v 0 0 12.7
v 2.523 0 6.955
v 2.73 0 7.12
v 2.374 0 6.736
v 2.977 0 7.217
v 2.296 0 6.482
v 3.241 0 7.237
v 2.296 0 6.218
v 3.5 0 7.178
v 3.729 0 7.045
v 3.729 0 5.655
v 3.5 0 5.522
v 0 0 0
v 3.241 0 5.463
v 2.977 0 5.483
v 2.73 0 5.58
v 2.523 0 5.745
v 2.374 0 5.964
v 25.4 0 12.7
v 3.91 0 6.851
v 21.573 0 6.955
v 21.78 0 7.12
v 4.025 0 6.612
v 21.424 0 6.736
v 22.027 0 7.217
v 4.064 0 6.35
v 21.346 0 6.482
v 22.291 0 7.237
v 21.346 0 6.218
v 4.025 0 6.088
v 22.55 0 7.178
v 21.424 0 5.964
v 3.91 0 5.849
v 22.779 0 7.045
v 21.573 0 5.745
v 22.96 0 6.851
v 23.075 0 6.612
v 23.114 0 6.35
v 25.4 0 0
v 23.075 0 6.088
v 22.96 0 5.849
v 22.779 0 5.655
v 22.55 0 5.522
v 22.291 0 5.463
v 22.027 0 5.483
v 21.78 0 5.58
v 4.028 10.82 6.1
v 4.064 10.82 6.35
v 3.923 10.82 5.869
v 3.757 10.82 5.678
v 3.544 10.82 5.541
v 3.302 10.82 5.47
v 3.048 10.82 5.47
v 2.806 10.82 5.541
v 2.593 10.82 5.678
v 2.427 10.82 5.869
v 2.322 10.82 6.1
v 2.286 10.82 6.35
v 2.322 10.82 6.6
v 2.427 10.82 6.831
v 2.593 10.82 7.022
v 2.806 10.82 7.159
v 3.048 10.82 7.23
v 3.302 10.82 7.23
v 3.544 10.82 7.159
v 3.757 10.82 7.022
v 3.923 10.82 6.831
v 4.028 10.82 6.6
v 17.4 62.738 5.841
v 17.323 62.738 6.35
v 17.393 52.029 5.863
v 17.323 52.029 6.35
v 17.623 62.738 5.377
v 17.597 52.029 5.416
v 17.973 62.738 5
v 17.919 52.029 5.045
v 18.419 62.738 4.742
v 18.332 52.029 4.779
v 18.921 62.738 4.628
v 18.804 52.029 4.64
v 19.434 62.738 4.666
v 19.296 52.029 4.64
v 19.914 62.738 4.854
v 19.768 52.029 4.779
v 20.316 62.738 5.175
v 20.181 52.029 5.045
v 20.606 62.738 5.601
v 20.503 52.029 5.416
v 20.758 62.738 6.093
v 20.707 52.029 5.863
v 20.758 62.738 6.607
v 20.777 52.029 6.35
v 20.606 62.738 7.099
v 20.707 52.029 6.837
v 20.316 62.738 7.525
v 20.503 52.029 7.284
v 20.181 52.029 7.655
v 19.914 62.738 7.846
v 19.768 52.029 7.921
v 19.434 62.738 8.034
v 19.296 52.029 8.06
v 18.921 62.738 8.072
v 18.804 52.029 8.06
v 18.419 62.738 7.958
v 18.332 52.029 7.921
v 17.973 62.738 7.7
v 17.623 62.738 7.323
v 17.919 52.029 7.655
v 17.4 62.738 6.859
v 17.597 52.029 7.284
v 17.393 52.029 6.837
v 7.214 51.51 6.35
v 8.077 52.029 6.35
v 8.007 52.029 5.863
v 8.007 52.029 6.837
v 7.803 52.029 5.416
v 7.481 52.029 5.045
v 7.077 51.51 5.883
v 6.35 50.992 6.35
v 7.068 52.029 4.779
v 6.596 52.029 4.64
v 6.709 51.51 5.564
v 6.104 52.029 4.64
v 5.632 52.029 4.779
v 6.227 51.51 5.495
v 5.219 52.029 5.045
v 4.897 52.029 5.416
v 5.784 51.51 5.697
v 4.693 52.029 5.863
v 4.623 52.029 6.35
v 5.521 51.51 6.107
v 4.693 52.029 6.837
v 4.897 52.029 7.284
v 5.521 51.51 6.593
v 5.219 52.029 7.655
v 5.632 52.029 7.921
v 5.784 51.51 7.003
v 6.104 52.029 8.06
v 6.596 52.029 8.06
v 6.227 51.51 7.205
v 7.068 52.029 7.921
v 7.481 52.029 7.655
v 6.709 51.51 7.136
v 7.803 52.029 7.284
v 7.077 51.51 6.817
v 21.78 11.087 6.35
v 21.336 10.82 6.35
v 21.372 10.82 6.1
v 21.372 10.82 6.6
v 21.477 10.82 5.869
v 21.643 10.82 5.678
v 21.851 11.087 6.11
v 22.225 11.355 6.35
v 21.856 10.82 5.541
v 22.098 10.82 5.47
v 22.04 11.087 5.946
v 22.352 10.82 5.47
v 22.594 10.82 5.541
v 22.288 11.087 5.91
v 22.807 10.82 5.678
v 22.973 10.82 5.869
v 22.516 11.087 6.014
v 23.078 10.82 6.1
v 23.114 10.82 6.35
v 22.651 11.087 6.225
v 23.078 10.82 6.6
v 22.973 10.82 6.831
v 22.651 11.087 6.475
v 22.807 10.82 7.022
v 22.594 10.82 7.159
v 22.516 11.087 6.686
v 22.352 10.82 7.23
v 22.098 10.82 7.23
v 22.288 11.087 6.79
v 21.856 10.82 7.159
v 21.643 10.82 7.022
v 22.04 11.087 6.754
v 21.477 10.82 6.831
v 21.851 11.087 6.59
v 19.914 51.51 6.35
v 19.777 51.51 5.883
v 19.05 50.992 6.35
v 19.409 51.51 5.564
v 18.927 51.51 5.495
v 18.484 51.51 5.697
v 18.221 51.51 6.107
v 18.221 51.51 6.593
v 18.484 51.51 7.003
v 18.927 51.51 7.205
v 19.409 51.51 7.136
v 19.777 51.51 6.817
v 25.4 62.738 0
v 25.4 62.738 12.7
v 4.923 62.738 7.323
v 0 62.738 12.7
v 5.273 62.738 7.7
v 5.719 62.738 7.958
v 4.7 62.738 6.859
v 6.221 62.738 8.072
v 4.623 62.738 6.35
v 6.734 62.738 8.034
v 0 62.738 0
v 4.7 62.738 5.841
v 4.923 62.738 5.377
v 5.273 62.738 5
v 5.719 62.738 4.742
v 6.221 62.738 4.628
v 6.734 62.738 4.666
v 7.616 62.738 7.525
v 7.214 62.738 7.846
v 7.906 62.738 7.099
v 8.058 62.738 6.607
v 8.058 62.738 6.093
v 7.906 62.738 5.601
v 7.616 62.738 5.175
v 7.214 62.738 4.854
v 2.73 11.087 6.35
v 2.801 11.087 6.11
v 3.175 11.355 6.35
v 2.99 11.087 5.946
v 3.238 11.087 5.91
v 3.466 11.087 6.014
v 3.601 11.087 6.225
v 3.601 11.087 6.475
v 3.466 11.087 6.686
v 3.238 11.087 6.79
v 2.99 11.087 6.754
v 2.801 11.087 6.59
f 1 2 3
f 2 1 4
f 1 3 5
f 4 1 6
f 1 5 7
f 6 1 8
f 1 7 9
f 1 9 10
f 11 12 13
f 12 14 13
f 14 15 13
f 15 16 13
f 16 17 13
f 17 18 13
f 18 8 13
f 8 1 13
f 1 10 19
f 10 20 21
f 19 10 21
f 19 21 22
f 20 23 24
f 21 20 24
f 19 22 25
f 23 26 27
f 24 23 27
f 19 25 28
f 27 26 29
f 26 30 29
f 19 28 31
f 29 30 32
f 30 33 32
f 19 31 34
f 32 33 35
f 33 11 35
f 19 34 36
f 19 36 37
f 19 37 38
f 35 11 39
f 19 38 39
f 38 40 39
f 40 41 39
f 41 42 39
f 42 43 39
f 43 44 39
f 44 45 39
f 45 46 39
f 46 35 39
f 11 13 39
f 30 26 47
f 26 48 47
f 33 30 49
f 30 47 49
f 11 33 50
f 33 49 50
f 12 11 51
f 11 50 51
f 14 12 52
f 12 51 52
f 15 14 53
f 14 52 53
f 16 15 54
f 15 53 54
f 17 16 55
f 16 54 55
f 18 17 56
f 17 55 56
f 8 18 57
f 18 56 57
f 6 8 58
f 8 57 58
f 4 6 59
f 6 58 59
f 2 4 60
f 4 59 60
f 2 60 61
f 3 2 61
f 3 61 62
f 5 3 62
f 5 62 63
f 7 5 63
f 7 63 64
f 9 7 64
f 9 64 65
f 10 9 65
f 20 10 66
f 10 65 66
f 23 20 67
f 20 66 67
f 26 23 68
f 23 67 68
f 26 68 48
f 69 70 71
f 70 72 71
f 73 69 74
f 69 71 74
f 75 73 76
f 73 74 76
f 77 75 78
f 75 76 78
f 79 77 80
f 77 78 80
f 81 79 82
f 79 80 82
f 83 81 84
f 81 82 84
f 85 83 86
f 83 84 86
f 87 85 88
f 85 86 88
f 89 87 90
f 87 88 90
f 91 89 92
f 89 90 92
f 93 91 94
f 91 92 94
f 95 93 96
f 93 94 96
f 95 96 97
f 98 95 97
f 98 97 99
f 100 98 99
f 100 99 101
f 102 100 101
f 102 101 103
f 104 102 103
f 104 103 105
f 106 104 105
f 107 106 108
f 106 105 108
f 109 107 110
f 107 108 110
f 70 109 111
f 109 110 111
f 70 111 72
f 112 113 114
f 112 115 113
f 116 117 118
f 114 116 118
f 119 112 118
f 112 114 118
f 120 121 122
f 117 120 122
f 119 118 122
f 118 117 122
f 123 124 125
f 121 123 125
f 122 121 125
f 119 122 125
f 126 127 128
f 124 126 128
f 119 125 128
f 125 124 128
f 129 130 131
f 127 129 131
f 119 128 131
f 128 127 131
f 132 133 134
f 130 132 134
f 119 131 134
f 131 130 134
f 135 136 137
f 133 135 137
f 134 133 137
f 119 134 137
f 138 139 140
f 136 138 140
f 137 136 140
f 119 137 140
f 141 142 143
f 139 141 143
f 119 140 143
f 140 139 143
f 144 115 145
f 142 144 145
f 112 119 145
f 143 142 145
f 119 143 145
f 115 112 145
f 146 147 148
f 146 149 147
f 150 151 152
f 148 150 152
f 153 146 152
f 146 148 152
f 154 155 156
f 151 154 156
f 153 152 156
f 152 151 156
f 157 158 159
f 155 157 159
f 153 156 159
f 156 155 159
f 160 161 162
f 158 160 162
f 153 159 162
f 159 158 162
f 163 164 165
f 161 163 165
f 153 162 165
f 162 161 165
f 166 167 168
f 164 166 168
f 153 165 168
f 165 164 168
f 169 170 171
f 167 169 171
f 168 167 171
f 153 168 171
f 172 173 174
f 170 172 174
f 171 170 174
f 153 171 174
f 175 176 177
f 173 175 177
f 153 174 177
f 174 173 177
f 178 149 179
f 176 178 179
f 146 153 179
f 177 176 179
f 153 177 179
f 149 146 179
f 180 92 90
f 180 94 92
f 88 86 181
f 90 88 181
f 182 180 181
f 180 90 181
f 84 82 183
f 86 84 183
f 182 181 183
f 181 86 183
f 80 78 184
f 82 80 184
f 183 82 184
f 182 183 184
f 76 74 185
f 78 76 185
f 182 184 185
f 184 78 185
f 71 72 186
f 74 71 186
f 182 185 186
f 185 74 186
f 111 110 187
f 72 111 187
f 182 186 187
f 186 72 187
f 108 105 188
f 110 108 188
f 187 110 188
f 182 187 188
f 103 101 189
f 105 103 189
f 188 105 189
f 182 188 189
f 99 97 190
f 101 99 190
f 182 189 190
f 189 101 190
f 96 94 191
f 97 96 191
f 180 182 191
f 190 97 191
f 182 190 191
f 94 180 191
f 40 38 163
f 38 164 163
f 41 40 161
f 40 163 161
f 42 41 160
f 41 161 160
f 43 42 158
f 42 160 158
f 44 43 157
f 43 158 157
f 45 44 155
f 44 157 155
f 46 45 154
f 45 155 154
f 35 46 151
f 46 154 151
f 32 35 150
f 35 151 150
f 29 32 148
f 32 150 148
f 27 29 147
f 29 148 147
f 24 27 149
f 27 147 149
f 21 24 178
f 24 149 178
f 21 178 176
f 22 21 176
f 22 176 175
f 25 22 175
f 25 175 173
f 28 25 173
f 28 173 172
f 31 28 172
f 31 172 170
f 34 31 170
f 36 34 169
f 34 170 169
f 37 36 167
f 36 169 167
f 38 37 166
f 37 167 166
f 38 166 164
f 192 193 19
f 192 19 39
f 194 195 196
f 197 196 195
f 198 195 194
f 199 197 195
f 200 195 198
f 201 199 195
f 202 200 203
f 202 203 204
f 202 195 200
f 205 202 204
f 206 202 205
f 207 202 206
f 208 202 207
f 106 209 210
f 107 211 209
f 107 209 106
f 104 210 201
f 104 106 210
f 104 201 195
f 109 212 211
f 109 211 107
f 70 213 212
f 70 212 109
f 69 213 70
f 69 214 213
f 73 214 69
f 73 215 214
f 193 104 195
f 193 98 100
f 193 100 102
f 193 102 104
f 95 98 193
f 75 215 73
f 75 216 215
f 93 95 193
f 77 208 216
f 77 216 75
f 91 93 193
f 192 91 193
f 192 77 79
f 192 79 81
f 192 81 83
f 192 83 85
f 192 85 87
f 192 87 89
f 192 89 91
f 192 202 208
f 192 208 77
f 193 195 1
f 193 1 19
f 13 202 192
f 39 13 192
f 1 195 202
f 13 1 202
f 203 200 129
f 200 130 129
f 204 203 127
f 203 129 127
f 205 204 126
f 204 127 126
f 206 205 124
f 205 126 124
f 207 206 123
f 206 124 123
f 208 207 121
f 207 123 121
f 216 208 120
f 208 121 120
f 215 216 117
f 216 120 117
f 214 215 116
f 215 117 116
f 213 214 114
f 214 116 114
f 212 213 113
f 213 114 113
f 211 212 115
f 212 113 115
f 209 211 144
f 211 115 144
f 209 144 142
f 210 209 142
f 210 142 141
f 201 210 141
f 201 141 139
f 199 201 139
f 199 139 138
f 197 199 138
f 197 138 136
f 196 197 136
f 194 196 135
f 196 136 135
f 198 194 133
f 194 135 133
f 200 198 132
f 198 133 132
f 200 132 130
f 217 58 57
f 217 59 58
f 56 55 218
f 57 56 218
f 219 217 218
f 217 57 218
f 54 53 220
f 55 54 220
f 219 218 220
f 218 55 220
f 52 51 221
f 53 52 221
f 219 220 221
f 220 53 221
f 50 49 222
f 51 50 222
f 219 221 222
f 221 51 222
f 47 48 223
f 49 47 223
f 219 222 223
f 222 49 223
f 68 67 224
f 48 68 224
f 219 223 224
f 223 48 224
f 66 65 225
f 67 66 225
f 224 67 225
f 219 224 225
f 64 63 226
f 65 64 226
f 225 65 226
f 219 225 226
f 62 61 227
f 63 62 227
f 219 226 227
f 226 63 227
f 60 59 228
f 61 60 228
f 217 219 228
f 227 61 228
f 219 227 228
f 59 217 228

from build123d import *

# Parameters (mm, degrees)
SKETCH1_W                 = 25.4
SKETCH1_H                 = 12.7
BOSS_EXTRUDE1_DEPTH       = 62.738
F_2_56_TAPPED_HOLE1_D     = 1.778
F_2_56_TAPPED_HOLE1_DEPTH = 10.8204
F_2_56_TAPPED_HOLE1_TIP   = 0.53416509
F_8_32_TAPPED_HOLE1_D     = 3.4544
F_8_32_TAPPED_HOLE1_DEPTH = 10.70864
F_8_32_TAPPED_HOLE1_TIP   = 1.037806461


with BuildPart() as part:
    # Sketch1 → Boss-Extrude1 (new body)
    with BuildSketch(Plane(origin=(0, 0, 0), x_dir=(1, 0, 0), z_dir=(0, 1, 0))):
        with Locations((12.7, -6.35)):
            Rectangle(SKETCH1_W, SKETCH1_H)
    extrude(amount=BOSS_EXTRUDE1_DEPTH)

    # #2-56 Tapped Hole1
    with Locations(Plane(origin=(0, 0, 0), x_dir=(-1, 0, 0), z_dir=(0, -1, 0))):
        with Locations((-3.175, -6.35), (-22.225, -6.35)):
            Hole(F_2_56_TAPPED_HOLE1_D / 2, depth=F_2_56_TAPPED_HOLE1_DEPTH)
            with Locations((0, 0, -(F_2_56_TAPPED_HOLE1_DEPTH + F_2_56_TAPPED_HOLE1_TIP / 2))):  # 118° drill point
                Cone(0, F_2_56_TAPPED_HOLE1_D / 2, F_2_56_TAPPED_HOLE1_TIP, mode=Mode.SUBTRACT)

    # #8-32 Tapped Hole1
    with Locations(Plane(origin=(0, 62.738, 0), x_dir=(1, 0, 0), z_dir=(0, 1, 0))):
        with Locations((6.35, -6.35), (19.05, -6.35)):
            Hole(F_8_32_TAPPED_HOLE1_D / 2, depth=F_8_32_TAPPED_HOLE1_DEPTH)
            with Locations((0, 0, -(F_8_32_TAPPED_HOLE1_DEPTH + F_8_32_TAPPED_HOLE1_TIP / 2))):  # 118° drill point
                Cone(0, F_8_32_TAPPED_HOLE1_D / 2, F_8_32_TAPPED_HOLE1_TIP, mode=Mode.SUBTRACT)


solid = part.part
